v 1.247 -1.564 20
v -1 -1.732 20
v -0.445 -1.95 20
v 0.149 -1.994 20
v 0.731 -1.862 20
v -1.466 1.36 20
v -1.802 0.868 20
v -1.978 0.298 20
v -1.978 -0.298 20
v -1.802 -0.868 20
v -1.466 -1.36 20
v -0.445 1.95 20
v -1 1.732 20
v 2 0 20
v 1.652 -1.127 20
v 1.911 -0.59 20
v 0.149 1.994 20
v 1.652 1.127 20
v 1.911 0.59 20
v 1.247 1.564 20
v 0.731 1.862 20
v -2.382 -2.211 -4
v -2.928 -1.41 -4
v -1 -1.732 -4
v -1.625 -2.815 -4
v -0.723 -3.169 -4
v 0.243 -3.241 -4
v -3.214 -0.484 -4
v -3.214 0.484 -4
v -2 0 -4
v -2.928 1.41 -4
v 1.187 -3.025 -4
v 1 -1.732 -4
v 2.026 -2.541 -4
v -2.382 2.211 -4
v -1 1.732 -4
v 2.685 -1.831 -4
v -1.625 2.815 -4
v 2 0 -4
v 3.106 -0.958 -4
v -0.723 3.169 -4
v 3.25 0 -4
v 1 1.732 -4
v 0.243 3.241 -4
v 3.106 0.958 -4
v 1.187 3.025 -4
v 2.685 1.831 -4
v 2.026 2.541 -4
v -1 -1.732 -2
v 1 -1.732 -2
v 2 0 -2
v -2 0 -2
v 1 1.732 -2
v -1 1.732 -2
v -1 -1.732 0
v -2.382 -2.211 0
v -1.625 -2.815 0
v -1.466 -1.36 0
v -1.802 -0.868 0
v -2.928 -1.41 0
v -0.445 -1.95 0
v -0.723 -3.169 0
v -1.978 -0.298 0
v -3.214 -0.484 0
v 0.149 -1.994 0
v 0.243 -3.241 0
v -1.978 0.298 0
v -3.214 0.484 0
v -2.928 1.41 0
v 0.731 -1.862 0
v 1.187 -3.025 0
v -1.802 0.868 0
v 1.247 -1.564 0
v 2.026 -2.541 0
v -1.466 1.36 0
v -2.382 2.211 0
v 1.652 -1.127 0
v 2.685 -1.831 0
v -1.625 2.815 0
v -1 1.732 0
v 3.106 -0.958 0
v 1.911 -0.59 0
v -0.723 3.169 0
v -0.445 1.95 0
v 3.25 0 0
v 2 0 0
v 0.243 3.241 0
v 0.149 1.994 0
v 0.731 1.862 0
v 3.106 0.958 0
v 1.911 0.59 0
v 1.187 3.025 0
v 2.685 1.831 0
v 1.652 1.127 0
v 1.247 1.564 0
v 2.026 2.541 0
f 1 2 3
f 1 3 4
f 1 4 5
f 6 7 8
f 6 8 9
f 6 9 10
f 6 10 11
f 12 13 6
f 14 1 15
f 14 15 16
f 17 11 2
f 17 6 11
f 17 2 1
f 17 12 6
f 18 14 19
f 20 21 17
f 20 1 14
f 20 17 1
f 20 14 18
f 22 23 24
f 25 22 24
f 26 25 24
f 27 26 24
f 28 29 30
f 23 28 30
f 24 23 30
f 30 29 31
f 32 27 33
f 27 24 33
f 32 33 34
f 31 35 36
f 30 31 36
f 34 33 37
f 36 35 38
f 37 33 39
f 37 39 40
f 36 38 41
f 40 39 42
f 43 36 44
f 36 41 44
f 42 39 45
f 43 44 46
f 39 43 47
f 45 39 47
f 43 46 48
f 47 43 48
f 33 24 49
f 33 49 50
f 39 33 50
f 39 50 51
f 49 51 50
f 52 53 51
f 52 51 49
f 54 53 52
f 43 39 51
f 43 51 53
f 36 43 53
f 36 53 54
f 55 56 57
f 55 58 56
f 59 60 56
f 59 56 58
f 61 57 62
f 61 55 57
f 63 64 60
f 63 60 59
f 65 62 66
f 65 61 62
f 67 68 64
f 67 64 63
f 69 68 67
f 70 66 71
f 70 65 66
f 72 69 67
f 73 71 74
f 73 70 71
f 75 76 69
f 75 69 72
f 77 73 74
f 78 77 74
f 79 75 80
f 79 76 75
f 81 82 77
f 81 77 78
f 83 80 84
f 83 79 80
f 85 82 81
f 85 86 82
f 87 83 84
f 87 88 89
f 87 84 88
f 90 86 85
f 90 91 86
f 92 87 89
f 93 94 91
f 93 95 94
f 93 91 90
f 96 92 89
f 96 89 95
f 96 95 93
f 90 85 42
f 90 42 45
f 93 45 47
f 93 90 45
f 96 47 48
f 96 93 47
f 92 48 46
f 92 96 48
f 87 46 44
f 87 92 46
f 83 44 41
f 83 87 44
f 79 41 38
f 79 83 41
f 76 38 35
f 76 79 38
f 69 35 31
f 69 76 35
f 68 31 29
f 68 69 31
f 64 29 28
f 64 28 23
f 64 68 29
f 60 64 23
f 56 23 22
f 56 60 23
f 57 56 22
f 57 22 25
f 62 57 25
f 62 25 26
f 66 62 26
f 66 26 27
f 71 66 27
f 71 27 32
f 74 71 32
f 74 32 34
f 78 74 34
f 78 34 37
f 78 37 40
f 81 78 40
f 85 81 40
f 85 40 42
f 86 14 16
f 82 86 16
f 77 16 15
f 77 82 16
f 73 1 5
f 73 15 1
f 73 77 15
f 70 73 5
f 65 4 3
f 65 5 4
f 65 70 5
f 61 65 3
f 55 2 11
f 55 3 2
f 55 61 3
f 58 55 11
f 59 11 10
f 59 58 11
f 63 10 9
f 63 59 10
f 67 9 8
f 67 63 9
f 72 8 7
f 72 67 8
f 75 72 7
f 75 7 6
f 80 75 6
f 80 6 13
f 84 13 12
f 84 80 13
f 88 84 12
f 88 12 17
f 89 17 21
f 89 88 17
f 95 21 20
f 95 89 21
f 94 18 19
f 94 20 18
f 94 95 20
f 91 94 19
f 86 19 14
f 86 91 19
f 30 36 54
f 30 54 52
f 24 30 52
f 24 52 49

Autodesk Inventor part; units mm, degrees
ref_plane "YZ Plane" through (0, 0, 0) normal (1, 0, 0) x (0, 1, 0)
ref_plane "XZ Plane" through (0, 0, 0) normal (0, 1, 0) x (-1, 0, 0)
ref_plane "XY Plane" through (0, 0, 0) normal (0, 0, 1) x (1, 0, 0)
sketch "Boceto1" plane through (0, 0, 0) normal (0, 0, 1) x (1, 0, 0)
  circle A0 centre (0, 0) radius 2
  circle A1 centre (0, 0) radius 3.25
  dimension "d0" = 4
  dimension "d1" = 6.5
extrude "Extrusión1" add sketch "Boceto1" along normal blind 20 contours A0
extrude "Extrusión2" add sketch "Boceto1" against normal blind 4 contours A0 | A1
sketch "Boceto2" plane through (0, 0, -4) normal (0, 0, -1) x (-1, 0, 0)
  line L0 (2, 0) -> (1, -1.7321)
  line L1 (1, -1.7321) -> (-1, -1.7321)
  line L2 (-1, -1.7321) -> (-2, 0)
  line L3 (-2, 0) -> (-1, 1.7321)
  line L4 (-1, 1.7321) -> (1, 1.7321)
  line L5 (1, 1.7321) -> (2, 0)
  point P0 (0, 0)
  point P1 (0, 0)
  dimension "d6" = 4
extrude "Extrusión3" cut sketch "Boceto2" against normal blind 2
thread "Rosca1" size "M4x0.7" class "6g" standard "ANSI Metric M Profile" full length
properties part number "TornilloM4X20mm" material "Acero inoxidable"
